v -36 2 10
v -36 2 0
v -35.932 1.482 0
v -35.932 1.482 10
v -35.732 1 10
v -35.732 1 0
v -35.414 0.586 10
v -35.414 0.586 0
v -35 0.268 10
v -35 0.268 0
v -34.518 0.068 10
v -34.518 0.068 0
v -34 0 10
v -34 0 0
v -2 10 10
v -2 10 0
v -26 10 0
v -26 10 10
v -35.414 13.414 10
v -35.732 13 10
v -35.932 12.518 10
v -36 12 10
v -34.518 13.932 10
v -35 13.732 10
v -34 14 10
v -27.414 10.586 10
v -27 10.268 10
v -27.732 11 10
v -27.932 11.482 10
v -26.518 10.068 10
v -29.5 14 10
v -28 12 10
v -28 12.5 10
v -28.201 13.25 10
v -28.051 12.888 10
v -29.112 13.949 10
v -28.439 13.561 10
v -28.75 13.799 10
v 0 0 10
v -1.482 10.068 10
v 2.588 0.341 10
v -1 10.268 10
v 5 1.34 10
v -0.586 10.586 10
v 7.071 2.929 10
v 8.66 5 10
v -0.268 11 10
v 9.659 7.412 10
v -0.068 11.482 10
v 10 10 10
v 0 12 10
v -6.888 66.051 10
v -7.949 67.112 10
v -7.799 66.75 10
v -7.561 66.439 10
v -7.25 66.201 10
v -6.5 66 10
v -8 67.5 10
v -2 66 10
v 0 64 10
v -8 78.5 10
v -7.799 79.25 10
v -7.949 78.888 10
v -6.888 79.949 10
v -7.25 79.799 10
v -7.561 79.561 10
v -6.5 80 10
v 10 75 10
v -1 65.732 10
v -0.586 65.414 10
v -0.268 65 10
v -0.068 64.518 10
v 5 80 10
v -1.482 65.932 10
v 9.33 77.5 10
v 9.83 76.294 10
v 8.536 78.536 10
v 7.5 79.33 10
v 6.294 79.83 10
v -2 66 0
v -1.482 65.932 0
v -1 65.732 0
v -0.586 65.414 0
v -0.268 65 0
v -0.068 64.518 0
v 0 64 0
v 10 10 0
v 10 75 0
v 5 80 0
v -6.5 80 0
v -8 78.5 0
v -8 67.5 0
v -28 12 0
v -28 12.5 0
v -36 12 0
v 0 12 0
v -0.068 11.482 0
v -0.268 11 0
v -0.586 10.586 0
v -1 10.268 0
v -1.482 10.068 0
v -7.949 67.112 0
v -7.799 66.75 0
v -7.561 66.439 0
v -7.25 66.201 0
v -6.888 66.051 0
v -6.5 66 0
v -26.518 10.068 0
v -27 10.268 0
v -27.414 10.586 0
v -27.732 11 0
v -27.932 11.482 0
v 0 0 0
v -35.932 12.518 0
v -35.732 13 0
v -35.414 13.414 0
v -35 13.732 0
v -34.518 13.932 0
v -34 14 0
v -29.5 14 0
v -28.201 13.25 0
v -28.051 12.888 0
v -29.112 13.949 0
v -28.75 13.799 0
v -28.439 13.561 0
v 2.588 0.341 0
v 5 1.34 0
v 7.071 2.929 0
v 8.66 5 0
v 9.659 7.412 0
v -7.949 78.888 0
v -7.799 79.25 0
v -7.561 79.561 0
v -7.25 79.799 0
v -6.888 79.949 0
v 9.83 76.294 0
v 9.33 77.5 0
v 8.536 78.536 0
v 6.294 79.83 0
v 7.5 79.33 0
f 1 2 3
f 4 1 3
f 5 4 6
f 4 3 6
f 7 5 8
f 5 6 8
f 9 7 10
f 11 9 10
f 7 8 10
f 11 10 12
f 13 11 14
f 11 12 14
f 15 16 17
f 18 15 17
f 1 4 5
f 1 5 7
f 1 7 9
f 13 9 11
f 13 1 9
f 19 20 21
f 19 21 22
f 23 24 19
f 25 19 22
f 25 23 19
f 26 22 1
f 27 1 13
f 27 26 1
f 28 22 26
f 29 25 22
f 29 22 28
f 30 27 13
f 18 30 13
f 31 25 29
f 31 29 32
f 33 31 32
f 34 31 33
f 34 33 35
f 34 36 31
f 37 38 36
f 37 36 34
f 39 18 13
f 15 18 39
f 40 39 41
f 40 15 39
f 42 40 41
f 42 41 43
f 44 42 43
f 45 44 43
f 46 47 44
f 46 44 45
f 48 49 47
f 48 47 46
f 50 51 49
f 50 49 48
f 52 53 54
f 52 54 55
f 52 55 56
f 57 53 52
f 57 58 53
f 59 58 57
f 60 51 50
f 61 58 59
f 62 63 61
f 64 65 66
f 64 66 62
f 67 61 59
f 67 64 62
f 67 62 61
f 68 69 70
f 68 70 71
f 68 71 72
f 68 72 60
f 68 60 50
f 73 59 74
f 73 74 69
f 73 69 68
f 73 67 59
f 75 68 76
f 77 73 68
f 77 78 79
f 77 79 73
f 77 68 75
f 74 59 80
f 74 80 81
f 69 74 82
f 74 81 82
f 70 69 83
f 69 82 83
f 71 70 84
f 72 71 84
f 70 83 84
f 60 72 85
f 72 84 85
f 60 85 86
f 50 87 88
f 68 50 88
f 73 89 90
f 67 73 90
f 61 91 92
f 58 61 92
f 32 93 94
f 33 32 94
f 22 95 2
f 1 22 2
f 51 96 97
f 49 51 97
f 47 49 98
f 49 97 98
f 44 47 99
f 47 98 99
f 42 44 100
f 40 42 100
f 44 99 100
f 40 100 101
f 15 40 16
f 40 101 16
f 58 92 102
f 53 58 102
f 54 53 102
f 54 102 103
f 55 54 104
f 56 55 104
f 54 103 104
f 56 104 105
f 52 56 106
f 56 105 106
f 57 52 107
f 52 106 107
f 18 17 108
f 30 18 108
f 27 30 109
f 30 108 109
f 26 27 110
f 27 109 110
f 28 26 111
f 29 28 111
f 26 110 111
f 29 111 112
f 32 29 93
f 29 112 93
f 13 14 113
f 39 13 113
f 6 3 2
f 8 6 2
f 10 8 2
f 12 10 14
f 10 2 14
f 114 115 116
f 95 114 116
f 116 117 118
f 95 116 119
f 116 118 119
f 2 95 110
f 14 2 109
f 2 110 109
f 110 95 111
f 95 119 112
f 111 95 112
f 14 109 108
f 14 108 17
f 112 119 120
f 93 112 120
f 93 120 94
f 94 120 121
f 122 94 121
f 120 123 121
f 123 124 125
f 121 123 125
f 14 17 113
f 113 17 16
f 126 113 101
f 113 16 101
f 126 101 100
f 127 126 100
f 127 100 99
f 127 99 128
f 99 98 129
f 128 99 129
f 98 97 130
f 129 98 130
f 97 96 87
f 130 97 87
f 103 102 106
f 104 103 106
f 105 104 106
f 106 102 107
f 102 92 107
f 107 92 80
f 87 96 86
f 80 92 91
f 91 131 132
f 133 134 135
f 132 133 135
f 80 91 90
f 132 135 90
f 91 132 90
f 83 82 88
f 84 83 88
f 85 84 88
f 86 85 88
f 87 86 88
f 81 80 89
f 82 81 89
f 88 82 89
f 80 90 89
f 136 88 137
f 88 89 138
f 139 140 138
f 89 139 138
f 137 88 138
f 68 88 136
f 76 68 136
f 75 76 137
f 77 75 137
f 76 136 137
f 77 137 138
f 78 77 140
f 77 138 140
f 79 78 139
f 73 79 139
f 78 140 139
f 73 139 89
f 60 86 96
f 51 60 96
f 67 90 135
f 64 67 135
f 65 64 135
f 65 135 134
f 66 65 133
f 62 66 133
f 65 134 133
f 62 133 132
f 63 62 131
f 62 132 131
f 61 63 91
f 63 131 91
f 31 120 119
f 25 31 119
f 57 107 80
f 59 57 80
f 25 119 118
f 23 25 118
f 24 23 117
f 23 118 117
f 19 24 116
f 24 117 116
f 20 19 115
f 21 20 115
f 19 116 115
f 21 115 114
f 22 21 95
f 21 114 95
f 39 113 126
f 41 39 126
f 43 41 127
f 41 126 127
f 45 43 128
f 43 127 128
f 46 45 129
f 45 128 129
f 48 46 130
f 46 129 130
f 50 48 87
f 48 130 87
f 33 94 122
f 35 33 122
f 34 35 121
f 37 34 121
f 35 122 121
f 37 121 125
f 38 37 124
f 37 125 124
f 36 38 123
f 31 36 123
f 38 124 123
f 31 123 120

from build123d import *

# Parameters (mm, degrees)
EXTRUDE_1_DEPTH = 10


with BuildPart() as part:
    # 草图1 → 凸台-拉伸1 (new body)
    with BuildSketch(Plane.XY):
        with BuildLine():
            Line((-6.5, 66), (-2, 66))
            ThreePointArc((-2, 66), (-0.585786438, 65.414213562), (0, 64))
            Line((0, 64), (0, 16))
            Line((0, 16), (0, 12))
            ThreePointArc((0, 12), (-0.585786438, 10.585786438), (-2, 10))
            Line((-2, 10), (-6.5, 10))
            Line((-6.5, 10), (-26, 10))
            ThreePointArc((-26, 10), (-27.414213562, 10.585786438), (-28, 12))
            Line((-28, 12), (-28, 12.5))
            ThreePointArc((-28, 12.5), (-28.439339828, 13.560660172), (-29.5, 14))
            Line((-29.5, 14), (-34, 14))
            ThreePointArc((-34, 14), (-35.414213562, 13.414213562), (-36, 12))
            Line((-36, 12), (-36, 2))
            ThreePointArc((-36, 2), (-35.414213562, 0.585786438), (-34, 0))
            Line((-34, 0), (0, 0))
            ThreePointArc((0, 0), (7.071067812, 2.928932188), (10, 10))
            Line((10, 10), (10, 75))
            ThreePointArc((10, 75), (8.535533906, 78.535533906), (5, 80))
            Line((5, 80), (-6.5, 80))
            ThreePointArc((-6.5, 80), (-7.560660172, 79.560660172), (-8, 78.5))
            Line((-8, 78.5), (-8, 67.5))
            ThreePointArc((-8, 67.5), (-7.560660172, 66.439339828), (-6.5, 66))
        make_face()
    extrude(amount=EXTRUDE_1_DEPTH)


solid = part.part
